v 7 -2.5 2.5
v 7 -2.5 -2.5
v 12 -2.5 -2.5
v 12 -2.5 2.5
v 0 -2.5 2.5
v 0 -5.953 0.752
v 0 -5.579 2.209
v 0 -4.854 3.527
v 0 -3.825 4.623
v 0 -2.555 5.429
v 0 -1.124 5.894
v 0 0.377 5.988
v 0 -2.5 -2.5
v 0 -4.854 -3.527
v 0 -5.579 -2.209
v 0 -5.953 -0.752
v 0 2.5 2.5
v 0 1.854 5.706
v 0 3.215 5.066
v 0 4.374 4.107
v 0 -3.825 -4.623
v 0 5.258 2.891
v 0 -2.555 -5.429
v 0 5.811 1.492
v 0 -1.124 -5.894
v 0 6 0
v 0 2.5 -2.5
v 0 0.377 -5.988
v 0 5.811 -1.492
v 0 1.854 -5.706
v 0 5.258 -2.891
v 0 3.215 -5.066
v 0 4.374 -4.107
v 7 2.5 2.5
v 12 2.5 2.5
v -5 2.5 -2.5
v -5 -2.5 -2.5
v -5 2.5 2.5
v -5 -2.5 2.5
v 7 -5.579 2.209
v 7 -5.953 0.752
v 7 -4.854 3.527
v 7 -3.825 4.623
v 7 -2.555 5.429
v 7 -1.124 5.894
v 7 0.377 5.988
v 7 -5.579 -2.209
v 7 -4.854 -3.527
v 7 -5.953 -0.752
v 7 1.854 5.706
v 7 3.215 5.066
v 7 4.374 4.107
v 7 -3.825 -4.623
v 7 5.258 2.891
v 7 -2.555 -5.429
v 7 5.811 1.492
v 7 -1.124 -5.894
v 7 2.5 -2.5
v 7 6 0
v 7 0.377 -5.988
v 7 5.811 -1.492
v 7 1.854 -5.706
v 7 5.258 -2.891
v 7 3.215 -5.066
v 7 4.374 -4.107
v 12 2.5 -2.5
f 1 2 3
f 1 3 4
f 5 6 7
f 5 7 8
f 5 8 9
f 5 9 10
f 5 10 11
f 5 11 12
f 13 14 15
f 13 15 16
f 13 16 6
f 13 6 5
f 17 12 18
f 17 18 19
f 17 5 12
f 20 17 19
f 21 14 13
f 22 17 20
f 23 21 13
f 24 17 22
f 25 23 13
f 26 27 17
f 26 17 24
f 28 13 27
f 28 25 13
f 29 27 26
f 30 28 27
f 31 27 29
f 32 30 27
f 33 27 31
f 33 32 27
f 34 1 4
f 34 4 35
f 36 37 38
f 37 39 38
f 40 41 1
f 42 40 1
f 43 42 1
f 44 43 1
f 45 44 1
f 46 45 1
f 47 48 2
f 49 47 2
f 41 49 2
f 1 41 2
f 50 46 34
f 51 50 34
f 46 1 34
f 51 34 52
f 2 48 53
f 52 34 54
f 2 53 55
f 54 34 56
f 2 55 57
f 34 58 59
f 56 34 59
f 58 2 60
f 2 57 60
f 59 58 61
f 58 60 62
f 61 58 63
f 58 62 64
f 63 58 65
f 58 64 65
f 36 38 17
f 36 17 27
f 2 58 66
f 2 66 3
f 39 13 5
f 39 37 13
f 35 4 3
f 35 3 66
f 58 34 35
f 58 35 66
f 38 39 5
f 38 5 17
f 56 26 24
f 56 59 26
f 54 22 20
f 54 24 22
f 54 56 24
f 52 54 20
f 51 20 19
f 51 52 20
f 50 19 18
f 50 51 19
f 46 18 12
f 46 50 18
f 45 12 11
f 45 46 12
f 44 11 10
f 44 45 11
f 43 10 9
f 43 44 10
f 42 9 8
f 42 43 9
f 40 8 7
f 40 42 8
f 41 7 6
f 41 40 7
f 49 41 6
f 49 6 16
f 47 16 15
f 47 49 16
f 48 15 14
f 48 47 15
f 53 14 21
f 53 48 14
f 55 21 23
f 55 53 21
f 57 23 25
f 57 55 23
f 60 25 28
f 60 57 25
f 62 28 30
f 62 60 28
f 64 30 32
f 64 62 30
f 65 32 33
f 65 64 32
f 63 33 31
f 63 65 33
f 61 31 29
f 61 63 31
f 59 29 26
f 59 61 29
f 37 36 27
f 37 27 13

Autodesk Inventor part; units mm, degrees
ref_plane "XZ Plane" through (0, 0, 0) normal (0, 1, 0) x (-1, 0, 0)
ref_plane "XY Plane" through (0, 0, 0) normal (0, 0, 1) x (1, 0, 0)
sketch "Sketch1" plane through (0, 0, 0) normal (0, 0, 1) x (1, 0, 0)
  line L0 (0, 0) -> (0, 6)
  line L1 (0, 6) -> (7, 6)
  line L2 (7, 6) -> (7, 0)
  line L3 (7, 0) -> (0, 0)
  dimension "d0" = 12
  dimension "d1" = 7
revolve "Revolution1" add sketch "Sketch1" angle 360 about axis through (7, 0, 0) along (-1, 0, 0)
ref_plane "Work Plane1" through (3.5, 0, 0) normal (1, 0, 0) x (0, 1, 0)
sketch "Sketch2" plane through (3.5, 0, 0) normal (1, 0, 0) x (0, 1, 0)
  line L0 (-2.5, 2.5) -> (2.5, 2.5)
  line L1 (2.5, 2.5) -> (2.5, -2.5)
  line L2 (2.5, -2.5) -> (-2.5, -2.5)
  line L3 (-2.5, -2.5) -> (-2.5, 2.5)
  line L4 (-2.5, 2.5) -> (2.5, -2.5) construction
  line L5 (2.5, 2.5) -> (-2.5, -2.5) construction
  point P0 (0, 0)
  dimension "d3" = 5
  dimension "d4" = 5
extrude "Extrusion1" add sketch "Sketch2" along normal mid plane 17
properties part number "210 part 3"
